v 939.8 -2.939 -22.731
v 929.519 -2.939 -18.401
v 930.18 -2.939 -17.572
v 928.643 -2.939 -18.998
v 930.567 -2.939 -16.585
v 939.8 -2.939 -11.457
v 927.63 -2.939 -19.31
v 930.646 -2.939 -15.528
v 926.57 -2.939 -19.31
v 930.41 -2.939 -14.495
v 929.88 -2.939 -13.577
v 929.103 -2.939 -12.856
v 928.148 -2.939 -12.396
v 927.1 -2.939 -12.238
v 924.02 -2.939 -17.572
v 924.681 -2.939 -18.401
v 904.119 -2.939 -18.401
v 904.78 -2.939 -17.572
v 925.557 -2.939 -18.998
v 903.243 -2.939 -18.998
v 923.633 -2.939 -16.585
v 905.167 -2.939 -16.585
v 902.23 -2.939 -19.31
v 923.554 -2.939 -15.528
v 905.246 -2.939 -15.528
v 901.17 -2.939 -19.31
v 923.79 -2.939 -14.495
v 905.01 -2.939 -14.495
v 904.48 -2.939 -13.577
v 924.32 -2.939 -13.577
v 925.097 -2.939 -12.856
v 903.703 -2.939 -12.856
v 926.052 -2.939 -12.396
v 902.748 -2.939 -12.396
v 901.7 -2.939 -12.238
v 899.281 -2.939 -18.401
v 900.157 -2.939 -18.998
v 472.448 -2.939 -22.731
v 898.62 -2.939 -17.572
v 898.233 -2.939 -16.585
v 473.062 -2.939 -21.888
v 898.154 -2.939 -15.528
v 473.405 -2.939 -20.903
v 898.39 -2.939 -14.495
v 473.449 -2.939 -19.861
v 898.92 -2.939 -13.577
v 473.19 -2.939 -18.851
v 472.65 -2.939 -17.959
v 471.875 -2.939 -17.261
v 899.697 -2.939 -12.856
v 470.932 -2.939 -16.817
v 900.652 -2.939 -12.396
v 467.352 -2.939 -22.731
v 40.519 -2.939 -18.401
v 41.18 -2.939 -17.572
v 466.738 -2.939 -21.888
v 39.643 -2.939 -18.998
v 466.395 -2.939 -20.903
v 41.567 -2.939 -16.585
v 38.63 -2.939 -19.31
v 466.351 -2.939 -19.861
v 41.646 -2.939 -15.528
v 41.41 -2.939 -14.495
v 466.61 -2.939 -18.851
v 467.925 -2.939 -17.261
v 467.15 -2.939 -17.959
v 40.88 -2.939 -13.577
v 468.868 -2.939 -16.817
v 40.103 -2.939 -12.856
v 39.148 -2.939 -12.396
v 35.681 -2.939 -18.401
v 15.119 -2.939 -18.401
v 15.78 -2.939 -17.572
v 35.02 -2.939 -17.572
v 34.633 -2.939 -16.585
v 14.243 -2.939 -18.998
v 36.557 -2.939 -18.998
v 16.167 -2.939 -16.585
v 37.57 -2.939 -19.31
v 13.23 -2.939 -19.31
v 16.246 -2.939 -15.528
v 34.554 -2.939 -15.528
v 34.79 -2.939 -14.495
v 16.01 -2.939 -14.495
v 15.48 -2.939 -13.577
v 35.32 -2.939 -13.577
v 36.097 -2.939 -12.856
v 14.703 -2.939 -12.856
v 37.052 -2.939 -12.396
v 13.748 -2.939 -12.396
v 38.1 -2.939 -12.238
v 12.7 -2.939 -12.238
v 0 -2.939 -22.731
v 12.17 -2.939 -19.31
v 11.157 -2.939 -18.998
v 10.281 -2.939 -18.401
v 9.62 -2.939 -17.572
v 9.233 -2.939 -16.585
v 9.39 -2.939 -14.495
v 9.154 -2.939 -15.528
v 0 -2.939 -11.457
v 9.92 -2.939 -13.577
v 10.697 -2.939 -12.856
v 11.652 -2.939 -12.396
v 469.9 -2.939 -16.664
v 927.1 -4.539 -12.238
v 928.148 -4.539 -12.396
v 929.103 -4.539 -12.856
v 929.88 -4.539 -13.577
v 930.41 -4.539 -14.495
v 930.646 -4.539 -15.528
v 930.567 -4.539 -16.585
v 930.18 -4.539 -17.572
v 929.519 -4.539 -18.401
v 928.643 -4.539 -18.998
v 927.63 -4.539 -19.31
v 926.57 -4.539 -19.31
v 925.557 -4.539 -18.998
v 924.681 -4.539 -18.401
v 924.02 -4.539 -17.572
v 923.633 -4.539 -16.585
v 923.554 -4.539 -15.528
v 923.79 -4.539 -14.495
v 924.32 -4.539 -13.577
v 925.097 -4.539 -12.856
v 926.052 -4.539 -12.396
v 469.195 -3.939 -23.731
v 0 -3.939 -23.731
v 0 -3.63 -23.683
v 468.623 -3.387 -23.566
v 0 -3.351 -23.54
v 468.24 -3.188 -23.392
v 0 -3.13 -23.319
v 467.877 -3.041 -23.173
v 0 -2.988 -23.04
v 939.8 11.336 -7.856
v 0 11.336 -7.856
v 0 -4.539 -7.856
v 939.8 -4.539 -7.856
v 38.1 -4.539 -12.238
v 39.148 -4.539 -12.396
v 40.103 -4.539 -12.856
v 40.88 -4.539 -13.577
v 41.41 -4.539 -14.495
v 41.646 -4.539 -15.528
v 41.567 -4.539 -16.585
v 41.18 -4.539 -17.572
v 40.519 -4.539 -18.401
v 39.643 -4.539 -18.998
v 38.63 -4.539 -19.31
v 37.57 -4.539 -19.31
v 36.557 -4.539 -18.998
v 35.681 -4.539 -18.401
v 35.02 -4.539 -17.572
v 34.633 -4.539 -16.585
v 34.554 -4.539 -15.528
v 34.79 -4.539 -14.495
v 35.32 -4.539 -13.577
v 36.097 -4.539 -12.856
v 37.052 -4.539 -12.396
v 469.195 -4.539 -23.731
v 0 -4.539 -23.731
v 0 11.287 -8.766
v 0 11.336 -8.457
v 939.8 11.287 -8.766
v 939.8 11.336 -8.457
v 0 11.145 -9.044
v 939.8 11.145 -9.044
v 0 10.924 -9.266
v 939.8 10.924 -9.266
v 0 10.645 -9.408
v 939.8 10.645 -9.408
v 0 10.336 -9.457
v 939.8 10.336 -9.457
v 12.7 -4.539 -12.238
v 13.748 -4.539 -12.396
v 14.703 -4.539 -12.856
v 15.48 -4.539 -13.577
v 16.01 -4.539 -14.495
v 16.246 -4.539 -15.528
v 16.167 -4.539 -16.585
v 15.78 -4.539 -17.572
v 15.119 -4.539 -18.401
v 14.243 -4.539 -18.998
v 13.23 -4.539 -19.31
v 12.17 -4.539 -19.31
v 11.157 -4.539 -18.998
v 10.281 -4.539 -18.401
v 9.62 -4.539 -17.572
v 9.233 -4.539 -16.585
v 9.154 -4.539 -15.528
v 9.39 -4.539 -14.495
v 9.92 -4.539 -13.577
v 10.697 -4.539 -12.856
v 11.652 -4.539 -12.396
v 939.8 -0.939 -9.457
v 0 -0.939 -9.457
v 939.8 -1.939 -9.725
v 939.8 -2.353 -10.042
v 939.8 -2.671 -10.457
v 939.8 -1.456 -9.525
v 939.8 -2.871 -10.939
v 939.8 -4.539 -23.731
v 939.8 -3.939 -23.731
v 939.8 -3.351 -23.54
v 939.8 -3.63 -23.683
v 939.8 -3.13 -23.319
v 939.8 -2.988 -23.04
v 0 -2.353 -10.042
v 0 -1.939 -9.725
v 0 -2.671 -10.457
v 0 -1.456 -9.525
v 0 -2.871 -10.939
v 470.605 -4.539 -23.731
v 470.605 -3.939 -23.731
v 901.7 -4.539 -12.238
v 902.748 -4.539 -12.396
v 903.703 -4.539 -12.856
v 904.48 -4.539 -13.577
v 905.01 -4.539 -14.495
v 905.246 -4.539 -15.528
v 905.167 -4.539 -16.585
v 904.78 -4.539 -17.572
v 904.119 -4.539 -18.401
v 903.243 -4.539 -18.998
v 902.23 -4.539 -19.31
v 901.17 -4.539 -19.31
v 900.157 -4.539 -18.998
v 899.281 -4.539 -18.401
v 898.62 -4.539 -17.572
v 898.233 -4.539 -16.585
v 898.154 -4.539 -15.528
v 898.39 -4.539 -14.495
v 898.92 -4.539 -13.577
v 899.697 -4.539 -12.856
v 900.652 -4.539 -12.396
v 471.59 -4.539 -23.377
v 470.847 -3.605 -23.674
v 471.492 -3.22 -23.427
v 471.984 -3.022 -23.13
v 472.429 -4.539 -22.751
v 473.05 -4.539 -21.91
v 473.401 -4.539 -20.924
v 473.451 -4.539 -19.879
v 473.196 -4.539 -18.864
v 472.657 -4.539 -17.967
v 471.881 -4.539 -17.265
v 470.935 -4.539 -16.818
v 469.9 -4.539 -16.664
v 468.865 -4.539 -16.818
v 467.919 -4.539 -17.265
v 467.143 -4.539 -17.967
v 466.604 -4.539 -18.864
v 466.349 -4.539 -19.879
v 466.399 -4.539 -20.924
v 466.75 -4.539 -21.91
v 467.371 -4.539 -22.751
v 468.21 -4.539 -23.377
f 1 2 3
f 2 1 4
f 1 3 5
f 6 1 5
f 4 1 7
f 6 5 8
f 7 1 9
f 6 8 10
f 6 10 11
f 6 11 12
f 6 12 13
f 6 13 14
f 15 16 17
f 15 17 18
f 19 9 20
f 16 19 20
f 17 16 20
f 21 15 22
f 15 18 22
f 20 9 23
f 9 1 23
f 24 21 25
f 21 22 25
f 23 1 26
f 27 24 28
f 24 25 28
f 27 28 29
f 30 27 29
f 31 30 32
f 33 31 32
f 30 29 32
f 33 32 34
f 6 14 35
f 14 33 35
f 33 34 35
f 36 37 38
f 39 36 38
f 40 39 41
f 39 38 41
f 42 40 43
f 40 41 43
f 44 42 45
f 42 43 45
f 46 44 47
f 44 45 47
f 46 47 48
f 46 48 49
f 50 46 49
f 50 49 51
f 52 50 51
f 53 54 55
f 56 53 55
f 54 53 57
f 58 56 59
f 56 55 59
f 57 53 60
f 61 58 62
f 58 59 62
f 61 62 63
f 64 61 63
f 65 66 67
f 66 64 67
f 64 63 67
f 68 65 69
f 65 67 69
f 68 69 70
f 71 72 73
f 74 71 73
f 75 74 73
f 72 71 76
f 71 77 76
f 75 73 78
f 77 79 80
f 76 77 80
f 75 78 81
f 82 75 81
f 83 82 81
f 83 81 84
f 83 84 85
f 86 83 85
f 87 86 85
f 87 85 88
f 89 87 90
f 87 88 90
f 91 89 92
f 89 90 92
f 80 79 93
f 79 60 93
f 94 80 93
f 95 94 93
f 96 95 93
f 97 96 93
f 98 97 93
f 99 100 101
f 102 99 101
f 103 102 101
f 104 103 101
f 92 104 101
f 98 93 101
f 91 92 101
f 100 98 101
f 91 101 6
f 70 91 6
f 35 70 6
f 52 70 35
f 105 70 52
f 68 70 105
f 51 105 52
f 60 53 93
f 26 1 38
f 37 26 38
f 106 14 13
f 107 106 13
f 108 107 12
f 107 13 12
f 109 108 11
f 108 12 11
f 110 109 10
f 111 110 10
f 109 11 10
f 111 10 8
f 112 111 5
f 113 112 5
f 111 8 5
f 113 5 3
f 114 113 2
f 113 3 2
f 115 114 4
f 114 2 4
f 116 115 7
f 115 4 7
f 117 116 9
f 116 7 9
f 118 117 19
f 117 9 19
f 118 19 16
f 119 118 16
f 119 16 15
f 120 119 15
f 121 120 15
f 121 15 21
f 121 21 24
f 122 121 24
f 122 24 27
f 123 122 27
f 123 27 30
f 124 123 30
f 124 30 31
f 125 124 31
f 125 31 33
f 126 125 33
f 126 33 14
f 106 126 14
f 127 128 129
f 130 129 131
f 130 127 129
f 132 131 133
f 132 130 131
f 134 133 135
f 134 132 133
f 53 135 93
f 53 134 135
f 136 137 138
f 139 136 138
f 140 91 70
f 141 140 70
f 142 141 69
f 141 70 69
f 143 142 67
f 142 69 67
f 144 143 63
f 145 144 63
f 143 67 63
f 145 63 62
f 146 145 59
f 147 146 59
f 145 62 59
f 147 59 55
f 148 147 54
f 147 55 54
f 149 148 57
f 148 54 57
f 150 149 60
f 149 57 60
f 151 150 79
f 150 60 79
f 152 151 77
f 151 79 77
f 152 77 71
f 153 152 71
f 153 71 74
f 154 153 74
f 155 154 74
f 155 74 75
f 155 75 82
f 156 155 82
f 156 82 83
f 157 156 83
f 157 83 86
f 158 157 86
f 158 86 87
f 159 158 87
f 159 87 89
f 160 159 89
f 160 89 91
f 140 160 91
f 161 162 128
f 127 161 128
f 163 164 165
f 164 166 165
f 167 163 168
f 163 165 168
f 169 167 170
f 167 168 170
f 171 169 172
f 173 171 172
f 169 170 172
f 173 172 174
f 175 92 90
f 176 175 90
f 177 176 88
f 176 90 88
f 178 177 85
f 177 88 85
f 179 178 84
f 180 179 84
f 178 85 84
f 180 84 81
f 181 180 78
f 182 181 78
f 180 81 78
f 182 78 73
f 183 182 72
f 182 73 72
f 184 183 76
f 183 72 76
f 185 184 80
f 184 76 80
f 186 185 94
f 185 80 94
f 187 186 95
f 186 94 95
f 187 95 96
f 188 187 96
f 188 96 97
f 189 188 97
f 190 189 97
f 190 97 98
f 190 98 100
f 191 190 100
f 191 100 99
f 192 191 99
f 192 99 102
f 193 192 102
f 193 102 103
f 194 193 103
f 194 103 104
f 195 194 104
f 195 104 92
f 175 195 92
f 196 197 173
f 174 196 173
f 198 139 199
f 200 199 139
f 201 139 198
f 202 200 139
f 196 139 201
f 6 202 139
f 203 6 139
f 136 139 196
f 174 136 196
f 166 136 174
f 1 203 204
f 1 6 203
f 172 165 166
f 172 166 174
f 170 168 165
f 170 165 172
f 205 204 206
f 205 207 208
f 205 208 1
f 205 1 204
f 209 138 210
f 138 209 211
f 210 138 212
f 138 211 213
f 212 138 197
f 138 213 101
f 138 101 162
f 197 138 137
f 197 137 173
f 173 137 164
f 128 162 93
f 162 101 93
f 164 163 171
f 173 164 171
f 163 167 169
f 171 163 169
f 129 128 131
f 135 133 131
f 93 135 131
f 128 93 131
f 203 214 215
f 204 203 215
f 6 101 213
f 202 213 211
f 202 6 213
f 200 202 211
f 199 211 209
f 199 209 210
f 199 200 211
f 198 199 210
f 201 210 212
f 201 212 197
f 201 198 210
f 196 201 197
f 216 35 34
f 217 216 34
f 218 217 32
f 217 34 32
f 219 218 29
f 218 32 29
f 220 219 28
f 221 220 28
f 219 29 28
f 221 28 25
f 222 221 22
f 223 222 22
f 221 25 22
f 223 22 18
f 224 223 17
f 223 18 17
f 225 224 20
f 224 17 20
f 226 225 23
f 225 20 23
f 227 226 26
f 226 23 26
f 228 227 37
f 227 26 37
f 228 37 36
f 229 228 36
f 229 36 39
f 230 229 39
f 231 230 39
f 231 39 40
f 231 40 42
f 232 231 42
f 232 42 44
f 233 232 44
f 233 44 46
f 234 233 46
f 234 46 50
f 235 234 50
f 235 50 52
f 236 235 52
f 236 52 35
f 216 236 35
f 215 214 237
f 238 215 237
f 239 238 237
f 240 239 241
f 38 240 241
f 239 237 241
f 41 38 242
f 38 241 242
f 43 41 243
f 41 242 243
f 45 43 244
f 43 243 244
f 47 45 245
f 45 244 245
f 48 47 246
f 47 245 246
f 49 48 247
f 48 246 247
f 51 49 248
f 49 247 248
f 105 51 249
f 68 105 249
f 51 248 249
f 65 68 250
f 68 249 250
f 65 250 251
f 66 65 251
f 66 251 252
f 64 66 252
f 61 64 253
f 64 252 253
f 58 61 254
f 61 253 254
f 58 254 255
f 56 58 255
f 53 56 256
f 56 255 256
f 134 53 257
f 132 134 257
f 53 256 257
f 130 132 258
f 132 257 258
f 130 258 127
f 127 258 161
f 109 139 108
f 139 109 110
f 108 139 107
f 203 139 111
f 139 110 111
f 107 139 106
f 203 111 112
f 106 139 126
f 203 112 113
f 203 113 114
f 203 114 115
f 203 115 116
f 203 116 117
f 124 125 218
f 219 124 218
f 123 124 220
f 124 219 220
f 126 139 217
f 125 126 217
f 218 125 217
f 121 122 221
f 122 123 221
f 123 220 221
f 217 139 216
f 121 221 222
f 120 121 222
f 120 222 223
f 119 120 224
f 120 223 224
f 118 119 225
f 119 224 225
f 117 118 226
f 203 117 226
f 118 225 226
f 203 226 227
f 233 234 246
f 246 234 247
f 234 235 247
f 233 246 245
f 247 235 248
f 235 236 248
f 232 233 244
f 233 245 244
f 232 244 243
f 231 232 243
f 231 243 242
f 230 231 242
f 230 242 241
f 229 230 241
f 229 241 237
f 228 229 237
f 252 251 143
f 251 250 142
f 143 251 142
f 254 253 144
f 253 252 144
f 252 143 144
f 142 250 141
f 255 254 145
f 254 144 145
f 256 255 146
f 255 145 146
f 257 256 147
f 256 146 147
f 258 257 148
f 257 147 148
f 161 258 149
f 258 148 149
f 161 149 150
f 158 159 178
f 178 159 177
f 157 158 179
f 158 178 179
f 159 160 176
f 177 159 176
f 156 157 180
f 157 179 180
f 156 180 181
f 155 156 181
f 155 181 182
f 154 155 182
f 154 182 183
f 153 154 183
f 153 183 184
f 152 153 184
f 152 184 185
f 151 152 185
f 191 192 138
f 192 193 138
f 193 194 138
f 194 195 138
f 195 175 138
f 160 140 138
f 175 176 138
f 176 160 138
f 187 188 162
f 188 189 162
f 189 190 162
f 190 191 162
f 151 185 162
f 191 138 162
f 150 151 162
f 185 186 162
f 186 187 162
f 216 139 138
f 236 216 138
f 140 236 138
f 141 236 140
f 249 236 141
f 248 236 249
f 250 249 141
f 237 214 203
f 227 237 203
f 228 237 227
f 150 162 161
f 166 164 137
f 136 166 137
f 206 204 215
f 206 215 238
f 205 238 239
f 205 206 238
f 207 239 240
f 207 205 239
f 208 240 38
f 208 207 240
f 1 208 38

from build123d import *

# Parameters (mm, degrees)
BOSS_EXTRUDE1_DEPTH = 939.8
SKETCH2_R           = 3.556
CUT_EXTRUDE1_DEPTH  = 941.207951624
FILLET1_R           = 1
FILLET2_R           = 2
SKETCH4_R           = 3.5687
CUT_EXTRUDE2_DEPTH  = 941.23360821


with BuildPart() as part:
    # Sketch1 → Boss-Extrude1 (new body)
    with BuildSketch(Plane(origin=(0, 0, 0), x_dir=(0, 0, -1), z_dir=(1, 0, 0))):
        Polygon((7.856463982, 11.336121381), (7.856463982, -4.538878619), (23.731463982, -4.538878619), (23.731463982, -2.938678619), (9.456663982, -2.938678619), (9.456663982, 11.336121381), align=None)
    extrude(amount=BOSS_EXTRUDE1_DEPTH)

    # Sketch2 → Cut-Extrude1 (cut, through all)
    with BuildSketch(Plane(origin=(0, -2.938678619, 0), x_dir=(1, 0, 0), z_dir=(0, 1, 0))):
        with Locations(Location((12.7, 15.793963982, 0), (0, 0, 270))):
            Circle(SKETCH2_R)
        with Locations(Location((38.1, 15.793963982, 0), (0, 0, 270))):
            Circle(SKETCH2_R)
        with Locations(Location((927.1, 15.793963982, 0), (0, 0, 270))):
            Circle(SKETCH2_R)
        with Locations(Location((901.7, 15.793963982, 0), (0, 0, 270))):
            Circle(SKETCH2_R)
    extrude(amount=-CUT_EXTRUDE1_DEPTH, mode=Mode.SUBTRACT)

    # Fillet1
    fillet1_edges = [part.edges().sort_by_distance(p)[0] for p in [
        (469.9, 11.336121381, -9.456663982),
        (469.9, -2.938678619, -23.731463982),
    ]]
    fillet(fillet1_edges, radius=FILLET1_R)

    # Fillet2
    fillet2_edges = [part.edges().sort_by_distance(p)[0] for p in [
        (469.9, -2.938678619, -9.456663982),
    ]]
    fillet(fillet2_edges, radius=FILLET2_R)

    # Sketch4 → Cut-Extrude2 (cut, through all)
    with BuildSketch(Plane.XZ.offset(4.538878619)):
        with Locations((469.900000001, -20.233163939)):
            Circle(SKETCH4_R)
    extrude(amount=-CUT_EXTRUDE2_DEPTH, mode=Mode.SUBTRACT)


solid = part.part
